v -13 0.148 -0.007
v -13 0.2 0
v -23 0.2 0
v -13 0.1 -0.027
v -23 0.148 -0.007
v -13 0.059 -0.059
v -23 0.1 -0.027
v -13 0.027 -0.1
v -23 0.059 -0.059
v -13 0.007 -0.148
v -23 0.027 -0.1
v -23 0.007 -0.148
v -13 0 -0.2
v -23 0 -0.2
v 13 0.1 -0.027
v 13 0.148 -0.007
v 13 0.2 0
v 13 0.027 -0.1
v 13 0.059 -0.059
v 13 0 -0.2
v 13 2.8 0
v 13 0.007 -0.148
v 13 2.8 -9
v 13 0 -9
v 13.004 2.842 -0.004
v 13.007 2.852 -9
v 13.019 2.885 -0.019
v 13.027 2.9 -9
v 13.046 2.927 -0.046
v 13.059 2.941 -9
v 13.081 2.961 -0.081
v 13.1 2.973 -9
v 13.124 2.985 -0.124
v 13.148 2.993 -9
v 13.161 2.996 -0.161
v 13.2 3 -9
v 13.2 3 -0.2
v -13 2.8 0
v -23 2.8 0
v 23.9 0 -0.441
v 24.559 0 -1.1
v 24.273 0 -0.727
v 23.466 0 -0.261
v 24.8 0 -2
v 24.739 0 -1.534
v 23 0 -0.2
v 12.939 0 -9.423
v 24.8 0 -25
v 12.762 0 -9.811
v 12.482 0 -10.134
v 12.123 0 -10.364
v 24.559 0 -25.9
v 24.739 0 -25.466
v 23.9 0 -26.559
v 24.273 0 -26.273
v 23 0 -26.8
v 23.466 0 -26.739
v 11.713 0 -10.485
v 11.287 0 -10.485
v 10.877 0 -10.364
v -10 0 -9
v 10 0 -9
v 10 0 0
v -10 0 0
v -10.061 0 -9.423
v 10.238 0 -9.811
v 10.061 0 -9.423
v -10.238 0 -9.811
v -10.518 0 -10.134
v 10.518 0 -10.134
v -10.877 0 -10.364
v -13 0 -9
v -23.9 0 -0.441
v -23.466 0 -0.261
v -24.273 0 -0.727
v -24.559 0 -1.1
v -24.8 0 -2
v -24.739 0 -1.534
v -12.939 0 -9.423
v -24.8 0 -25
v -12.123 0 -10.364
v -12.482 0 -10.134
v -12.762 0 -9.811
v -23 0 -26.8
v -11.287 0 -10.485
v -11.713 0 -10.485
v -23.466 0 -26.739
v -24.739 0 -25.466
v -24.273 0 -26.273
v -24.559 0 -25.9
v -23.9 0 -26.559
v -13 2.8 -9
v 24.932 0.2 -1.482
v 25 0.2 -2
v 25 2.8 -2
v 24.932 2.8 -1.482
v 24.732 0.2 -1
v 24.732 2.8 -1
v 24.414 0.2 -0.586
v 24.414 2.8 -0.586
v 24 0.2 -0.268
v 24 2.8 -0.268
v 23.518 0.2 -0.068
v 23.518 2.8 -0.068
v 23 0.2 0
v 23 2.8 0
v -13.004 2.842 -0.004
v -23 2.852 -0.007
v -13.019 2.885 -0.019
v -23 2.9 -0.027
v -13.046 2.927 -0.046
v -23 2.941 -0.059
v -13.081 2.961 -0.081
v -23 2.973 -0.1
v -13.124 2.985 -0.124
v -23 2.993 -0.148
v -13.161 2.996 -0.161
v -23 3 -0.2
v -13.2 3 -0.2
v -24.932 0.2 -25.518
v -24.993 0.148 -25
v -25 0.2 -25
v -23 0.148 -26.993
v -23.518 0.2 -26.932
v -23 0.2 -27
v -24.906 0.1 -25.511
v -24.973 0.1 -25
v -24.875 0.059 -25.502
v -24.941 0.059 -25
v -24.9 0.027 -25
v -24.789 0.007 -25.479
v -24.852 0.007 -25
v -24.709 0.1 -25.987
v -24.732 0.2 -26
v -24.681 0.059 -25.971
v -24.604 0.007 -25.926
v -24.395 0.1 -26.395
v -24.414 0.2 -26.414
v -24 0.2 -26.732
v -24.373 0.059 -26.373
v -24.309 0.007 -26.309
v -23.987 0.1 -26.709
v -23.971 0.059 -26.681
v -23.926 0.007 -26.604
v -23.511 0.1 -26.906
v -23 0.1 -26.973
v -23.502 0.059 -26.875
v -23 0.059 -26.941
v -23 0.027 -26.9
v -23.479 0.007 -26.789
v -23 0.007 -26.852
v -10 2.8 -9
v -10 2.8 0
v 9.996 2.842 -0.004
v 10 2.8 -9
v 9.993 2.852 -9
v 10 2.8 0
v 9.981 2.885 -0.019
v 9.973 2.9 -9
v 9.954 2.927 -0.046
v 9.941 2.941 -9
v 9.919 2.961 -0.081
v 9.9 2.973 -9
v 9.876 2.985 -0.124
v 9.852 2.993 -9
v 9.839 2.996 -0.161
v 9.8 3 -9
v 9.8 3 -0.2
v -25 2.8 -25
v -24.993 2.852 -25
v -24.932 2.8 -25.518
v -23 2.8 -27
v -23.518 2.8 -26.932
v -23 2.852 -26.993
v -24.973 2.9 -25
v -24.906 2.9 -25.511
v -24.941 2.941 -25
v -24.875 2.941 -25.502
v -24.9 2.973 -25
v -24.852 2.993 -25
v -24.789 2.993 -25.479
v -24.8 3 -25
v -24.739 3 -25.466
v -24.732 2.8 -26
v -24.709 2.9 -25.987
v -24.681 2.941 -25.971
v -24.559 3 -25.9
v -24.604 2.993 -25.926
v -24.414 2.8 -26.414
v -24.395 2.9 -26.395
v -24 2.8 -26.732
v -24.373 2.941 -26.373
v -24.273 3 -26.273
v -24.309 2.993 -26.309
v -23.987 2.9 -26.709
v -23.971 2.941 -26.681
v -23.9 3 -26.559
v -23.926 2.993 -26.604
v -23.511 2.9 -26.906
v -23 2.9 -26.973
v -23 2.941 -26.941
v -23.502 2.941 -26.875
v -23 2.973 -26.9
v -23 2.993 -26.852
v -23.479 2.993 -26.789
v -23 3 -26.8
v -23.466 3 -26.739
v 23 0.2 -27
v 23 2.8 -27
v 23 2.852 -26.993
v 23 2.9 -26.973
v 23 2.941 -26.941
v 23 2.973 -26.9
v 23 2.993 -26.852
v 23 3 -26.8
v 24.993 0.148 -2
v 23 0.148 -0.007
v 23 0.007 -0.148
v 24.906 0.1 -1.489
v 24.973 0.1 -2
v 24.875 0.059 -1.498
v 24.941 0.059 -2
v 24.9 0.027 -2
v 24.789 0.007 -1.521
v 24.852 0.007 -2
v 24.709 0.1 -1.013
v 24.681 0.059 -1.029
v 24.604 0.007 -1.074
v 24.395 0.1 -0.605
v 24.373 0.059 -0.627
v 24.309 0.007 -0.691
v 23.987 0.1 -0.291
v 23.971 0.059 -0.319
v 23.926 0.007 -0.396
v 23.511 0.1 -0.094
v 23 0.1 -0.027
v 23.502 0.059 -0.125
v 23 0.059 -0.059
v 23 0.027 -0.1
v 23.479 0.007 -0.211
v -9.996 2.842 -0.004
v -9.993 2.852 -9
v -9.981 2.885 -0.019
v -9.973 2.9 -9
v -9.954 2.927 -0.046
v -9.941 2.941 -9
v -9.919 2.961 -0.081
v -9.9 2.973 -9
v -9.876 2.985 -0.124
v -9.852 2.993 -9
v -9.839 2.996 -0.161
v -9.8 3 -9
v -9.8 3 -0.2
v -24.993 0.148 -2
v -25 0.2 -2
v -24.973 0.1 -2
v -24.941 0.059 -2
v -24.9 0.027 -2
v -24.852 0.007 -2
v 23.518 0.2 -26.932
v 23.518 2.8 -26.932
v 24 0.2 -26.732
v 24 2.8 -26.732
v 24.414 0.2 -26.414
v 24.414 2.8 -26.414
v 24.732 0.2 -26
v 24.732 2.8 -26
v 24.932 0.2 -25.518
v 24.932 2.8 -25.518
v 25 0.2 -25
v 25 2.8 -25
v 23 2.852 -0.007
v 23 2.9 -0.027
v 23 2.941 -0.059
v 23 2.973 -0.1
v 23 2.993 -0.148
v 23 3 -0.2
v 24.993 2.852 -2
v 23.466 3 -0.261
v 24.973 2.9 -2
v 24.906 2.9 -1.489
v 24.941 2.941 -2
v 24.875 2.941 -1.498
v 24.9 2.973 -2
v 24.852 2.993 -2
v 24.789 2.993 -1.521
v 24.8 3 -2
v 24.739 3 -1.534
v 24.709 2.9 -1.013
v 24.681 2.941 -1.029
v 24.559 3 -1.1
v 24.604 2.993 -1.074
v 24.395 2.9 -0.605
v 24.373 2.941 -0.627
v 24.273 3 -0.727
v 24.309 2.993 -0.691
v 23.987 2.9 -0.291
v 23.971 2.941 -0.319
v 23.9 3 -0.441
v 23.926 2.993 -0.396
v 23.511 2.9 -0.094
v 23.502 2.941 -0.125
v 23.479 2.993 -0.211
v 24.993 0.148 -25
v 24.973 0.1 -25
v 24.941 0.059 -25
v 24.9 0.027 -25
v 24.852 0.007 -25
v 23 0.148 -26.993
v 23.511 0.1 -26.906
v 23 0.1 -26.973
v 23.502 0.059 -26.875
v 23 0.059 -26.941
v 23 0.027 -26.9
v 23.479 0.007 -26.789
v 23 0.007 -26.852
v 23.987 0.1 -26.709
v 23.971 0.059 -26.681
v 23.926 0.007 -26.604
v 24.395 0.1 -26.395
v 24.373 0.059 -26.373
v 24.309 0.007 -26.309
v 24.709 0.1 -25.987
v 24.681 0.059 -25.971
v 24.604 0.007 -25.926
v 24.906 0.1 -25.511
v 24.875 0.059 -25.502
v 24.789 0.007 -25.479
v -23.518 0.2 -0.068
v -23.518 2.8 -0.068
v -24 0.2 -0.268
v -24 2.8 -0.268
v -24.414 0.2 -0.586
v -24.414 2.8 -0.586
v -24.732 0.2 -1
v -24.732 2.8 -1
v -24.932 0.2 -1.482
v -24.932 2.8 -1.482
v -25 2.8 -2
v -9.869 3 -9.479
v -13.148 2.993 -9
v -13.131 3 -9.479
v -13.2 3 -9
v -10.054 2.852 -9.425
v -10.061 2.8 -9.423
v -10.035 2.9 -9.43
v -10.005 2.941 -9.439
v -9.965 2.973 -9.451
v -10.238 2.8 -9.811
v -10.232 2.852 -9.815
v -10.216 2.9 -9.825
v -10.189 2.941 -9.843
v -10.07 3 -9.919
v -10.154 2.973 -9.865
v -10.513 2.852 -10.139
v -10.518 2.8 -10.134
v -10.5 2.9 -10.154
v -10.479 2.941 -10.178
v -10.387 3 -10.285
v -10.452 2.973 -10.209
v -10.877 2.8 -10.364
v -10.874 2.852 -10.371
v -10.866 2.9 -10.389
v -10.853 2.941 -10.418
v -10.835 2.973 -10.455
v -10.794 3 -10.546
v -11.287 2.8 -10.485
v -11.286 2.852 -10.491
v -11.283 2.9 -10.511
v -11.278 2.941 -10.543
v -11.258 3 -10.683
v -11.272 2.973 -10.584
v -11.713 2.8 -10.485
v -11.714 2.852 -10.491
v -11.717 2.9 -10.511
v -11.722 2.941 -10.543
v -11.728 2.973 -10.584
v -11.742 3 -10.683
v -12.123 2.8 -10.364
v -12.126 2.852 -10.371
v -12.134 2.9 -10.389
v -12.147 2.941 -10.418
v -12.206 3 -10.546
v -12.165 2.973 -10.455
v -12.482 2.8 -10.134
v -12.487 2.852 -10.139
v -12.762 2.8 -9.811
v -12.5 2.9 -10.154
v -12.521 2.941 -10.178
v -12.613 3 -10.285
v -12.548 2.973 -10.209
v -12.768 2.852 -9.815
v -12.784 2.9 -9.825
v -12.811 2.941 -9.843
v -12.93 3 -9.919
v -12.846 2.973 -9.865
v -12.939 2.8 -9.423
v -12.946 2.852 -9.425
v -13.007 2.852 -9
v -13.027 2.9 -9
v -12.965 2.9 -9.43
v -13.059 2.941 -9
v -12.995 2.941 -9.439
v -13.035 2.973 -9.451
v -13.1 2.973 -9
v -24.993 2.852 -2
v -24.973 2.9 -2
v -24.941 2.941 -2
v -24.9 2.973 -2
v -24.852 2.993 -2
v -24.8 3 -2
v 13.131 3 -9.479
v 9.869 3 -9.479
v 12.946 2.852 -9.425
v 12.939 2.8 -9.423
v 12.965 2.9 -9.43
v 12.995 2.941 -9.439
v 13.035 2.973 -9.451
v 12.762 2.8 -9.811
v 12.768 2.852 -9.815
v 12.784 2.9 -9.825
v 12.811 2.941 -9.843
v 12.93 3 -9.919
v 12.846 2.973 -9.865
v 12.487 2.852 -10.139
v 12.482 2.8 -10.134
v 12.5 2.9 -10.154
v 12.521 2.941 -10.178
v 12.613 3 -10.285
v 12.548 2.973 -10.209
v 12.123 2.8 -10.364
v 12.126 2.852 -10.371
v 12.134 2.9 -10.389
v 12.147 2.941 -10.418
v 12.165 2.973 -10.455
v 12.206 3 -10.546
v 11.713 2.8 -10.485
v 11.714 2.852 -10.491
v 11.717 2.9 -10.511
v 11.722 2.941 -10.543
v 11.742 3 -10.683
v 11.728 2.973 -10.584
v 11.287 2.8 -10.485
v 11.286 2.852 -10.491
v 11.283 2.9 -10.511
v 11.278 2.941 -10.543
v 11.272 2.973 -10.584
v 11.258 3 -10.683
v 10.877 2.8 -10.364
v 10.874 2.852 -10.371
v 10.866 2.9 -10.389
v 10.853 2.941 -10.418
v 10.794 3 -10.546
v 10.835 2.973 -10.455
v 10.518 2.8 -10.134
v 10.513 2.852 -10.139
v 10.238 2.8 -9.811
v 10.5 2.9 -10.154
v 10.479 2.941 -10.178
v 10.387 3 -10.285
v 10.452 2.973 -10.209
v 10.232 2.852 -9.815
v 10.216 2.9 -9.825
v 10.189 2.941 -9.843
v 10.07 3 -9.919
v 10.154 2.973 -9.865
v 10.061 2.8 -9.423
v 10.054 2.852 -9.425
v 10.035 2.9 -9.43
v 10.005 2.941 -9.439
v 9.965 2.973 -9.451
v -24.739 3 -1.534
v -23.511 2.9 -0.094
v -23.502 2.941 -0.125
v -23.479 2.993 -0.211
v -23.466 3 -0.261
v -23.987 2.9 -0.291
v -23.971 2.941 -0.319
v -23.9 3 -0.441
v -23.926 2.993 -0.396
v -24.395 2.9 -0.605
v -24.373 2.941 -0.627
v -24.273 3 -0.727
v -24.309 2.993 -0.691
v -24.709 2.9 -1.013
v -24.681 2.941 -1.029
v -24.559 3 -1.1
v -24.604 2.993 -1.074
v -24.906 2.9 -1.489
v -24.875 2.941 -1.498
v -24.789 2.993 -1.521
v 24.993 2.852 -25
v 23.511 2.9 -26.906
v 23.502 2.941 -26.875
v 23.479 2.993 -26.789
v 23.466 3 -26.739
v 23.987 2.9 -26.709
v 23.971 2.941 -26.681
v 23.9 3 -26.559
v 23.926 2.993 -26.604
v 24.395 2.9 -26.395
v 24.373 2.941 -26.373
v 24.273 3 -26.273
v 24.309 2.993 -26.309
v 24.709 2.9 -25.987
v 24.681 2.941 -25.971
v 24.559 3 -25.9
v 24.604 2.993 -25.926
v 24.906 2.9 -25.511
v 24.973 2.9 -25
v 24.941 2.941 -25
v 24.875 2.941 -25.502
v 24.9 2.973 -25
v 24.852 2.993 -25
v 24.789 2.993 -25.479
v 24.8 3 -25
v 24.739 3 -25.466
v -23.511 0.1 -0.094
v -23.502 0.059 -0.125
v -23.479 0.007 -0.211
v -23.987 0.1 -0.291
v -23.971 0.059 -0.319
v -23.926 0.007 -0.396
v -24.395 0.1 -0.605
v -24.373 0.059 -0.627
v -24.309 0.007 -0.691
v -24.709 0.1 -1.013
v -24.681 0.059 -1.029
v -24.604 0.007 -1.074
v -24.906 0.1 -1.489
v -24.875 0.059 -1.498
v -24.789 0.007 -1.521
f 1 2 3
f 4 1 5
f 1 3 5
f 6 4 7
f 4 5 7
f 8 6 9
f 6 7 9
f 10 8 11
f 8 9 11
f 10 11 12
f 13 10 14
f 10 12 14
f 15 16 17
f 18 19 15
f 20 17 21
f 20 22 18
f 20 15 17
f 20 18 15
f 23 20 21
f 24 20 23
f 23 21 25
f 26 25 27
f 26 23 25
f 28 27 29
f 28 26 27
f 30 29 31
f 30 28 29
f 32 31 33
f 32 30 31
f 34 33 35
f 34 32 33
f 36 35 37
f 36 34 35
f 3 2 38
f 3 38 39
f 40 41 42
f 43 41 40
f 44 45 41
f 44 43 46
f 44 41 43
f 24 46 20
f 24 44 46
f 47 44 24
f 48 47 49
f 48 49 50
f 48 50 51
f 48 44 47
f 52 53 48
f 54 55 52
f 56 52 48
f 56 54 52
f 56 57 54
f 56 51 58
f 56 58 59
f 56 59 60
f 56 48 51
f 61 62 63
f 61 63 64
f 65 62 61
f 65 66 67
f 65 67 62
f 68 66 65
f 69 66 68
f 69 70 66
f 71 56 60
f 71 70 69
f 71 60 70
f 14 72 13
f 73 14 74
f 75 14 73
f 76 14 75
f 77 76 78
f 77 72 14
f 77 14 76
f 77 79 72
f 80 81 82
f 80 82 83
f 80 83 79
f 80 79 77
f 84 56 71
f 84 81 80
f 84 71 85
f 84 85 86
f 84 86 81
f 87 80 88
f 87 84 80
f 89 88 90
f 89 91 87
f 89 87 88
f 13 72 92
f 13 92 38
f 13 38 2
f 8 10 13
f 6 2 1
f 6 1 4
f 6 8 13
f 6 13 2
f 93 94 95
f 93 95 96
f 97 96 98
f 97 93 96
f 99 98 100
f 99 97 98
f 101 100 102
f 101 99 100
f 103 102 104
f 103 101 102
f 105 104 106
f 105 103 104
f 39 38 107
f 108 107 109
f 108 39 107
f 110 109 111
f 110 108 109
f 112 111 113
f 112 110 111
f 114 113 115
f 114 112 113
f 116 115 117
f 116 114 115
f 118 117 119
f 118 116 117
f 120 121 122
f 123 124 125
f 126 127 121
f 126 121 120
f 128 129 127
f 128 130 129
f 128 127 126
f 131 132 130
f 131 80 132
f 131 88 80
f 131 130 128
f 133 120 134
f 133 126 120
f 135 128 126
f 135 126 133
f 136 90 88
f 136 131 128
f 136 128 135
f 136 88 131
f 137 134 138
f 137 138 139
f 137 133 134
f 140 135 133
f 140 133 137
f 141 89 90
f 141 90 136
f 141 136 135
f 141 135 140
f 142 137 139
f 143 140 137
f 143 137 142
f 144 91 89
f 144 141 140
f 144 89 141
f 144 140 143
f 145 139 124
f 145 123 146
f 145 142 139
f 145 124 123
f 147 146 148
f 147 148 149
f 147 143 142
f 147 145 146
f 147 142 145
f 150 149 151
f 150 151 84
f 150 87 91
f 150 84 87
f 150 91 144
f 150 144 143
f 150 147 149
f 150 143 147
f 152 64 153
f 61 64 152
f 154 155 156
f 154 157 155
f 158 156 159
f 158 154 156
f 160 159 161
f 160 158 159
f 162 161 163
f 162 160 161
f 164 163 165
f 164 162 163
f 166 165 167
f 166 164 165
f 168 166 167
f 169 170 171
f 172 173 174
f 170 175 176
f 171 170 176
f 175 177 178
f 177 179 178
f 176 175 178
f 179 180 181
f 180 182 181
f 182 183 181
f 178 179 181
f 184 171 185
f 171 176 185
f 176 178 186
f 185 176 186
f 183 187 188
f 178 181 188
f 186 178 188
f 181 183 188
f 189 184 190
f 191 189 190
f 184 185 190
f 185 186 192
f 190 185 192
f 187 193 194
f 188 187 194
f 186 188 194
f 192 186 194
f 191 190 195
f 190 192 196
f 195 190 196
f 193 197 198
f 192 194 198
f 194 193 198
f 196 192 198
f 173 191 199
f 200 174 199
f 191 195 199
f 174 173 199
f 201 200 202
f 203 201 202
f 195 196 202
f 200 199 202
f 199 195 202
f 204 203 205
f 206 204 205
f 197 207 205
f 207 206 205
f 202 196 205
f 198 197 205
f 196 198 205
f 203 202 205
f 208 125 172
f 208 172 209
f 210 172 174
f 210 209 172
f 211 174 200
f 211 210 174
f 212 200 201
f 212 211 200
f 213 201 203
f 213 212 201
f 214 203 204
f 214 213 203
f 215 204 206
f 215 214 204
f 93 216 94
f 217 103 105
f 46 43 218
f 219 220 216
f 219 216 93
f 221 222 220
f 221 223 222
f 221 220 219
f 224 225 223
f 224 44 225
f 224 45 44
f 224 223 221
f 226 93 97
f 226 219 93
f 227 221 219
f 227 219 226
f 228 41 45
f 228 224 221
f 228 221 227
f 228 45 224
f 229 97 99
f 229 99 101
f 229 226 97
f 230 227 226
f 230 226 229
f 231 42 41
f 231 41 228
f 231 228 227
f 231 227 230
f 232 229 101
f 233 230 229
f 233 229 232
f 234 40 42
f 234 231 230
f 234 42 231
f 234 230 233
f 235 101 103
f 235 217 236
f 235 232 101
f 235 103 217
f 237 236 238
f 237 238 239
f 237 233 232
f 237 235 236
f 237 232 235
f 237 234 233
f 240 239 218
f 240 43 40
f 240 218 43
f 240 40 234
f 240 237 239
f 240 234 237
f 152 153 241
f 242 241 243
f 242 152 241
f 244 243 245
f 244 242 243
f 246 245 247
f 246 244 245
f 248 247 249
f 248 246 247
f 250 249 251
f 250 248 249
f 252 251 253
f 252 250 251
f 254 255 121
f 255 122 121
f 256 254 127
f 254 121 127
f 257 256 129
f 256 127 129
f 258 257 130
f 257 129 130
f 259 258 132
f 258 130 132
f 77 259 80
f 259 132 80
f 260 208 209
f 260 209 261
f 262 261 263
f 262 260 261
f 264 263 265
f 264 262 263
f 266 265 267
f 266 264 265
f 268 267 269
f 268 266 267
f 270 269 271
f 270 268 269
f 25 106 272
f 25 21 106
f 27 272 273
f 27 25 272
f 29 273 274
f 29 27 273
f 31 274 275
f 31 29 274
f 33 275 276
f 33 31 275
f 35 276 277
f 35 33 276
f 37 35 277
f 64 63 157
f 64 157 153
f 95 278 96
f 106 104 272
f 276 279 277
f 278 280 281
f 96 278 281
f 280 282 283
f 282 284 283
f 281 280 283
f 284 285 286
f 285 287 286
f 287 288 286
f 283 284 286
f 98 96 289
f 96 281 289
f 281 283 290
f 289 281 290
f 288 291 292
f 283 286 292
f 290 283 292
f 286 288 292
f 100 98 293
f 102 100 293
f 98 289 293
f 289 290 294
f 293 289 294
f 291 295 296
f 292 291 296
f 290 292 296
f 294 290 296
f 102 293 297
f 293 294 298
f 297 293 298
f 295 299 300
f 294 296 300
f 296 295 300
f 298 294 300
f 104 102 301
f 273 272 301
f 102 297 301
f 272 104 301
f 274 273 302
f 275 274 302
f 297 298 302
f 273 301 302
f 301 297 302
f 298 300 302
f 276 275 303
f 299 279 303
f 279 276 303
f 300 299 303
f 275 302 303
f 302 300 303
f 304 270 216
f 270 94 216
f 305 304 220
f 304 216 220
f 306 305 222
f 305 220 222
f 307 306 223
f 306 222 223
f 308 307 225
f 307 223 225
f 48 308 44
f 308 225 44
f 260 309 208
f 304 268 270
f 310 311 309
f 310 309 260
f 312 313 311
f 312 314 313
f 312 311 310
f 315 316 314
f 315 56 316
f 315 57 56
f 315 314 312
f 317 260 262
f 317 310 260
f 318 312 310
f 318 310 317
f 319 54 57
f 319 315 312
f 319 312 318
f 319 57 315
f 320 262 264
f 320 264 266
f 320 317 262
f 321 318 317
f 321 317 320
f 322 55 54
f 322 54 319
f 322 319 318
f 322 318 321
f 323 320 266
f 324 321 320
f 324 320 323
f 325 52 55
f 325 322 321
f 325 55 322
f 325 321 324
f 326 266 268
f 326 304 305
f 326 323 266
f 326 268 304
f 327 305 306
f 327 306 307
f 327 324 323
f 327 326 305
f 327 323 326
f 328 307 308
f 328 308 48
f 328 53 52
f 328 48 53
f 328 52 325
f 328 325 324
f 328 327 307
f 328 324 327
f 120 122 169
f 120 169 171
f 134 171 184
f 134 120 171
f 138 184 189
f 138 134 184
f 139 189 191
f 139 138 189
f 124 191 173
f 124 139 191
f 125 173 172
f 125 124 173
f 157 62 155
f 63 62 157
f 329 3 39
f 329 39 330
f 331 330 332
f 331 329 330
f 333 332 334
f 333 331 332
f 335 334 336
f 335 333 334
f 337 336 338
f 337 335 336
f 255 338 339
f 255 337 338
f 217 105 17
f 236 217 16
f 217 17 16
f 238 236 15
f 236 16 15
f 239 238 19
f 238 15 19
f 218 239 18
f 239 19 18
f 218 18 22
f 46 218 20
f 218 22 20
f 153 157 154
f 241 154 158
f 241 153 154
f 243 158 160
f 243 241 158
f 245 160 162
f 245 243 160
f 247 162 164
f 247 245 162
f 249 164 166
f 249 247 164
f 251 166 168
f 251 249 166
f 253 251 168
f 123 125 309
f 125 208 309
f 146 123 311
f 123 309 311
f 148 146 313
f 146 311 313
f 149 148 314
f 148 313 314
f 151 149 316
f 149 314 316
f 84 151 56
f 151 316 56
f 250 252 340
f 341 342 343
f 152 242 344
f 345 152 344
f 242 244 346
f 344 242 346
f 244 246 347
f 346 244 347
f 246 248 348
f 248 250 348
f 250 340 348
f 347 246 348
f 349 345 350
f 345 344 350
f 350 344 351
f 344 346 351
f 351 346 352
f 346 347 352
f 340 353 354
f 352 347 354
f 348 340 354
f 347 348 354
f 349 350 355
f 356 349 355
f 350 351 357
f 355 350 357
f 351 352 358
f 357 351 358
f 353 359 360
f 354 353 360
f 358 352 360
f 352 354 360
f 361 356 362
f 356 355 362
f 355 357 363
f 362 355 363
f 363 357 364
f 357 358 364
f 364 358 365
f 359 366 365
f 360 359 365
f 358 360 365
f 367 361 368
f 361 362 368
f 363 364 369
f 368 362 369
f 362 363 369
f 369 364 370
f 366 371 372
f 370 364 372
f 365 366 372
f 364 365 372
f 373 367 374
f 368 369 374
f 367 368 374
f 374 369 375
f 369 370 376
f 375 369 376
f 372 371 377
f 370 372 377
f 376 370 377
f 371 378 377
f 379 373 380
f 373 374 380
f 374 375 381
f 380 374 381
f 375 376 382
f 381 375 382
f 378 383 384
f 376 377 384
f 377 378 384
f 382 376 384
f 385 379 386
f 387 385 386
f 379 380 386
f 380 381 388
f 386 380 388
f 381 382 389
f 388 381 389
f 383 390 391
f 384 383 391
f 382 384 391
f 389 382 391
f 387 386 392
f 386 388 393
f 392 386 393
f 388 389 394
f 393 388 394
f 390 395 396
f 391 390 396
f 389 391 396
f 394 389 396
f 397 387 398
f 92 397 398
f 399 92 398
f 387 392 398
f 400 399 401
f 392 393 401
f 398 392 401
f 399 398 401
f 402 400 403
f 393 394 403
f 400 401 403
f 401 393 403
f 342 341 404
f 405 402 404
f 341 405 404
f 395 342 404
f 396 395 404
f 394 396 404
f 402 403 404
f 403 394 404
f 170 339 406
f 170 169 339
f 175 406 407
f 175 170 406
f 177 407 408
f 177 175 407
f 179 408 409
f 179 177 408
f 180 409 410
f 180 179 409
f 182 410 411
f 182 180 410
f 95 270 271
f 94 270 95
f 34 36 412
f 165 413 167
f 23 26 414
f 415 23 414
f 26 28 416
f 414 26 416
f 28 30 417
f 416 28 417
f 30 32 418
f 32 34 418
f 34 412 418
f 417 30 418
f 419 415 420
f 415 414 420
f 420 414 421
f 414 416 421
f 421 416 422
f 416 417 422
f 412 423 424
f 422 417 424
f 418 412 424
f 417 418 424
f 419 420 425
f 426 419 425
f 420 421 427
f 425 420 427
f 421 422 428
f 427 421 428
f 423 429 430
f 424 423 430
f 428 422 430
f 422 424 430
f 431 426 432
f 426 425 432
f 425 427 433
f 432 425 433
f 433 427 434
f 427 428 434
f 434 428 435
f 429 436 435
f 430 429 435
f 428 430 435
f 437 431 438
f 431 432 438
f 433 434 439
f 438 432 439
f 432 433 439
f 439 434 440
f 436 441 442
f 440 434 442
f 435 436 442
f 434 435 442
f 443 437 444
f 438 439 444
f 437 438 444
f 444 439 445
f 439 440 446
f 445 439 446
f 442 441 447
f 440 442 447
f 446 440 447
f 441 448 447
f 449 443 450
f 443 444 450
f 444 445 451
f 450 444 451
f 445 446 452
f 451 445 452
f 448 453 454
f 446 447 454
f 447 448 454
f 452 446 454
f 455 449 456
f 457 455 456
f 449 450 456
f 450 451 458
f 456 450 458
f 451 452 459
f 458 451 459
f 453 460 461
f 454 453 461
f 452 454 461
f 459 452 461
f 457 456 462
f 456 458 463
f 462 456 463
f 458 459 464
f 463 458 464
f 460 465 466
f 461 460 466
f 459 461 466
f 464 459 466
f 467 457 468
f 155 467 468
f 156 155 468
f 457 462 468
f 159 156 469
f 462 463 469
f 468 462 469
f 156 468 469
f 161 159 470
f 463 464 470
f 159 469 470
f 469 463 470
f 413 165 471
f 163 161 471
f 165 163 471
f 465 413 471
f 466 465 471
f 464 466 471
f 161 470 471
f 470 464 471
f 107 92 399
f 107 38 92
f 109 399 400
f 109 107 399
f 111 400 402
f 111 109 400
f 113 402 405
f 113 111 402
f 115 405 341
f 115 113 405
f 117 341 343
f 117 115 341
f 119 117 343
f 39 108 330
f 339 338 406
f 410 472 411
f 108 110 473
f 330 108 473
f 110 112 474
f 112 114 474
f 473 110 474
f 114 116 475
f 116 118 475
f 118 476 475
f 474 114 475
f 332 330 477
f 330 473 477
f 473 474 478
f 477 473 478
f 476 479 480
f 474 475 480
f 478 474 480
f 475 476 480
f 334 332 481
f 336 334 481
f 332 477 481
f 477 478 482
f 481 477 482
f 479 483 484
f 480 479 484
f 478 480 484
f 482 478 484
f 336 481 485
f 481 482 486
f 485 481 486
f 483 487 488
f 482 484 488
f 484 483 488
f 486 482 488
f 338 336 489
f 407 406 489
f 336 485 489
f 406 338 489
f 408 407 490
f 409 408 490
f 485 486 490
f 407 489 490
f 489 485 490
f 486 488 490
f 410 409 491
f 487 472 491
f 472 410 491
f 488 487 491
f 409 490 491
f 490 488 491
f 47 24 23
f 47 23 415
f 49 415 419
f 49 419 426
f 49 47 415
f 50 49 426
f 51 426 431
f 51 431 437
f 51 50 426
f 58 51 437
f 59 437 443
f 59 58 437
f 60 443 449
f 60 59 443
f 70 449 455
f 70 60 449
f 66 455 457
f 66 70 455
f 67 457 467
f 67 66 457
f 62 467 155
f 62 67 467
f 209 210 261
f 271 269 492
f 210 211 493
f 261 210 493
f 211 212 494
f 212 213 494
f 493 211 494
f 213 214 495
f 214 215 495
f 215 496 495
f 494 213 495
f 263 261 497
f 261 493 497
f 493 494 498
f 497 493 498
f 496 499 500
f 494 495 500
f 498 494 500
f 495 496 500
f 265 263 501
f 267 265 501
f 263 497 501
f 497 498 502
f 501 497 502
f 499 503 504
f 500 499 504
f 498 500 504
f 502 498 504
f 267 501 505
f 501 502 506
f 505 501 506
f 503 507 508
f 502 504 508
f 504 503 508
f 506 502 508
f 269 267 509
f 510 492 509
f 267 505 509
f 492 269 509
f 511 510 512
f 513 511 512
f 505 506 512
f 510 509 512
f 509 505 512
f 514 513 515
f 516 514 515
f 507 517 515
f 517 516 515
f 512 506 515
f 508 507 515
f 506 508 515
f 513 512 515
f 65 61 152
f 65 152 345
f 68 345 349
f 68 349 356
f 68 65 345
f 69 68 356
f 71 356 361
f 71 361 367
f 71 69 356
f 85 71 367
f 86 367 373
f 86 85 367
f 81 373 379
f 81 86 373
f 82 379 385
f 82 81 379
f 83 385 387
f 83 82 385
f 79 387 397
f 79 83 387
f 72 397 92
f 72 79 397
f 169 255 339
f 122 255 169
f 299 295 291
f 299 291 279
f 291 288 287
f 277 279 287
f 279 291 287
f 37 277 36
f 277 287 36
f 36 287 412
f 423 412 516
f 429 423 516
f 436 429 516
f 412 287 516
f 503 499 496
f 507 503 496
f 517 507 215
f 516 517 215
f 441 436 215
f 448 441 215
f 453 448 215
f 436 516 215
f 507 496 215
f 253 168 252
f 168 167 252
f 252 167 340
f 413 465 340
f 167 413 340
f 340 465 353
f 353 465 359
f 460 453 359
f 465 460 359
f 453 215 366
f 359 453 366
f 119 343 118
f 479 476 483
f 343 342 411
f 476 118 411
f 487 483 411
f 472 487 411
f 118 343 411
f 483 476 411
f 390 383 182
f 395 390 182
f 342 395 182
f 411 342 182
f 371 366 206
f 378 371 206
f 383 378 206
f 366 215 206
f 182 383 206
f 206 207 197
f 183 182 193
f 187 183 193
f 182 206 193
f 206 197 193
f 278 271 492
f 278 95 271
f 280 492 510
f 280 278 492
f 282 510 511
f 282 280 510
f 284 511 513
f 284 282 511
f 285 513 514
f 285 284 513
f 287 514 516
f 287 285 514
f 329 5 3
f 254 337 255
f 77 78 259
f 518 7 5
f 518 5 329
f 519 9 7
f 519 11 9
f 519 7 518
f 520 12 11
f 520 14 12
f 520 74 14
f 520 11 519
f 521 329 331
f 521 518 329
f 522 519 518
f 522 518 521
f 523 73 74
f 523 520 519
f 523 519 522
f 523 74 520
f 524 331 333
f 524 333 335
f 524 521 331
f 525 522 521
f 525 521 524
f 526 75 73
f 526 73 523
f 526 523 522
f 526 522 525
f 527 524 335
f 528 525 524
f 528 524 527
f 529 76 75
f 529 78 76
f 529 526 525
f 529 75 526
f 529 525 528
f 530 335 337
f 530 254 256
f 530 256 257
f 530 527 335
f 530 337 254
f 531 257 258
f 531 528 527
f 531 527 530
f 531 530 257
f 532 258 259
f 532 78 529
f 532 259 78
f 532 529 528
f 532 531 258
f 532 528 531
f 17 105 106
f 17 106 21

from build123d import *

# Parameters (mm, degrees)
BOSS_EXTRUDE1_DEPTH = 3
FILLET1_R           = 0.2


with BuildPart() as part:
    # Sketch1 → Boss-Extrude1 (new body)
    with BuildSketch(Plane(origin=(0, 0, 0), x_dir=(1, 0, 0), z_dir=(0, 1, 0))):
        with BuildLine():
            Line((10, 0), (-10, 0))
            Line((-10, 0), (-10, 9))
            ThreePointArc((-10, 9), (-11.5, 10.5), (-13, 9))
            Line((-13, 9), (-13, 0))
            Line((-13, 0), (-23, 0))
            ThreePointArc((-23, 0), (-24.414213562, 0.585786438), (-25, 2))
            Line((-25, 2), (-25, 25))
            ThreePointArc((-25, 25), (-24.414213562, 26.414213562), (-23, 27))
            Line((-23, 27), (23, 27))
            ThreePointArc((23, 27), (24.414213562, 26.414213562), (25, 25))
            Line((25, 25), (25, 2))
            ThreePointArc((25, 2), (24.414213562, 0.585786438), (23, 0))
            Line((23, 0), (13, 0))
            Line((13, 0), (13, 9))
            ThreePointArc((13, 9), (11.5, 10.5), (10, 9))
            Line((10, 9), (10, 0))
        make_face()
    extrude(amount=BOSS_EXTRUDE1_DEPTH)

    # Fillet1
    fillet1_edges = [part.edges().sort_by_distance(p)[0] for p in [
        (0, 3, 0),
        (10, 3, -4.5),
        (-18, 0, 0),
        (-24.414213562, 0, -0.585786438),
        (-25, 0, -13.5),
        (-24.414213562, 0, -26.414213562),
        (11.5, 3, -10.5),
        (0, 0, -27),
        (24.414213562, 0, -26.414213562),
        (25, 0, -13.5),
        (24.414213562, 0, -0.585786438),
        (18, 0, 0),
        (13, 3, -4.5),
        (18, 3, 0),
        (24.414213562, 3, -0.585786438),
        (25, 3, -13.5),
        (24.414213562, 3, -26.414213562),
        (0, 3, -27),
        (-24.414213562, 3, -26.414213562),
        (-11.5, 3, -10.5),
        (-25, 3, -13.5),
        (-24.414213562, 3, -0.585786438),
        (-18, 3, 0),
        (-13, 3, -4.5),
        (-10, 3, -4.5),
    ]]
    fillet(fillet1_edges, radius=FILLET1_R)


solid = part.part
